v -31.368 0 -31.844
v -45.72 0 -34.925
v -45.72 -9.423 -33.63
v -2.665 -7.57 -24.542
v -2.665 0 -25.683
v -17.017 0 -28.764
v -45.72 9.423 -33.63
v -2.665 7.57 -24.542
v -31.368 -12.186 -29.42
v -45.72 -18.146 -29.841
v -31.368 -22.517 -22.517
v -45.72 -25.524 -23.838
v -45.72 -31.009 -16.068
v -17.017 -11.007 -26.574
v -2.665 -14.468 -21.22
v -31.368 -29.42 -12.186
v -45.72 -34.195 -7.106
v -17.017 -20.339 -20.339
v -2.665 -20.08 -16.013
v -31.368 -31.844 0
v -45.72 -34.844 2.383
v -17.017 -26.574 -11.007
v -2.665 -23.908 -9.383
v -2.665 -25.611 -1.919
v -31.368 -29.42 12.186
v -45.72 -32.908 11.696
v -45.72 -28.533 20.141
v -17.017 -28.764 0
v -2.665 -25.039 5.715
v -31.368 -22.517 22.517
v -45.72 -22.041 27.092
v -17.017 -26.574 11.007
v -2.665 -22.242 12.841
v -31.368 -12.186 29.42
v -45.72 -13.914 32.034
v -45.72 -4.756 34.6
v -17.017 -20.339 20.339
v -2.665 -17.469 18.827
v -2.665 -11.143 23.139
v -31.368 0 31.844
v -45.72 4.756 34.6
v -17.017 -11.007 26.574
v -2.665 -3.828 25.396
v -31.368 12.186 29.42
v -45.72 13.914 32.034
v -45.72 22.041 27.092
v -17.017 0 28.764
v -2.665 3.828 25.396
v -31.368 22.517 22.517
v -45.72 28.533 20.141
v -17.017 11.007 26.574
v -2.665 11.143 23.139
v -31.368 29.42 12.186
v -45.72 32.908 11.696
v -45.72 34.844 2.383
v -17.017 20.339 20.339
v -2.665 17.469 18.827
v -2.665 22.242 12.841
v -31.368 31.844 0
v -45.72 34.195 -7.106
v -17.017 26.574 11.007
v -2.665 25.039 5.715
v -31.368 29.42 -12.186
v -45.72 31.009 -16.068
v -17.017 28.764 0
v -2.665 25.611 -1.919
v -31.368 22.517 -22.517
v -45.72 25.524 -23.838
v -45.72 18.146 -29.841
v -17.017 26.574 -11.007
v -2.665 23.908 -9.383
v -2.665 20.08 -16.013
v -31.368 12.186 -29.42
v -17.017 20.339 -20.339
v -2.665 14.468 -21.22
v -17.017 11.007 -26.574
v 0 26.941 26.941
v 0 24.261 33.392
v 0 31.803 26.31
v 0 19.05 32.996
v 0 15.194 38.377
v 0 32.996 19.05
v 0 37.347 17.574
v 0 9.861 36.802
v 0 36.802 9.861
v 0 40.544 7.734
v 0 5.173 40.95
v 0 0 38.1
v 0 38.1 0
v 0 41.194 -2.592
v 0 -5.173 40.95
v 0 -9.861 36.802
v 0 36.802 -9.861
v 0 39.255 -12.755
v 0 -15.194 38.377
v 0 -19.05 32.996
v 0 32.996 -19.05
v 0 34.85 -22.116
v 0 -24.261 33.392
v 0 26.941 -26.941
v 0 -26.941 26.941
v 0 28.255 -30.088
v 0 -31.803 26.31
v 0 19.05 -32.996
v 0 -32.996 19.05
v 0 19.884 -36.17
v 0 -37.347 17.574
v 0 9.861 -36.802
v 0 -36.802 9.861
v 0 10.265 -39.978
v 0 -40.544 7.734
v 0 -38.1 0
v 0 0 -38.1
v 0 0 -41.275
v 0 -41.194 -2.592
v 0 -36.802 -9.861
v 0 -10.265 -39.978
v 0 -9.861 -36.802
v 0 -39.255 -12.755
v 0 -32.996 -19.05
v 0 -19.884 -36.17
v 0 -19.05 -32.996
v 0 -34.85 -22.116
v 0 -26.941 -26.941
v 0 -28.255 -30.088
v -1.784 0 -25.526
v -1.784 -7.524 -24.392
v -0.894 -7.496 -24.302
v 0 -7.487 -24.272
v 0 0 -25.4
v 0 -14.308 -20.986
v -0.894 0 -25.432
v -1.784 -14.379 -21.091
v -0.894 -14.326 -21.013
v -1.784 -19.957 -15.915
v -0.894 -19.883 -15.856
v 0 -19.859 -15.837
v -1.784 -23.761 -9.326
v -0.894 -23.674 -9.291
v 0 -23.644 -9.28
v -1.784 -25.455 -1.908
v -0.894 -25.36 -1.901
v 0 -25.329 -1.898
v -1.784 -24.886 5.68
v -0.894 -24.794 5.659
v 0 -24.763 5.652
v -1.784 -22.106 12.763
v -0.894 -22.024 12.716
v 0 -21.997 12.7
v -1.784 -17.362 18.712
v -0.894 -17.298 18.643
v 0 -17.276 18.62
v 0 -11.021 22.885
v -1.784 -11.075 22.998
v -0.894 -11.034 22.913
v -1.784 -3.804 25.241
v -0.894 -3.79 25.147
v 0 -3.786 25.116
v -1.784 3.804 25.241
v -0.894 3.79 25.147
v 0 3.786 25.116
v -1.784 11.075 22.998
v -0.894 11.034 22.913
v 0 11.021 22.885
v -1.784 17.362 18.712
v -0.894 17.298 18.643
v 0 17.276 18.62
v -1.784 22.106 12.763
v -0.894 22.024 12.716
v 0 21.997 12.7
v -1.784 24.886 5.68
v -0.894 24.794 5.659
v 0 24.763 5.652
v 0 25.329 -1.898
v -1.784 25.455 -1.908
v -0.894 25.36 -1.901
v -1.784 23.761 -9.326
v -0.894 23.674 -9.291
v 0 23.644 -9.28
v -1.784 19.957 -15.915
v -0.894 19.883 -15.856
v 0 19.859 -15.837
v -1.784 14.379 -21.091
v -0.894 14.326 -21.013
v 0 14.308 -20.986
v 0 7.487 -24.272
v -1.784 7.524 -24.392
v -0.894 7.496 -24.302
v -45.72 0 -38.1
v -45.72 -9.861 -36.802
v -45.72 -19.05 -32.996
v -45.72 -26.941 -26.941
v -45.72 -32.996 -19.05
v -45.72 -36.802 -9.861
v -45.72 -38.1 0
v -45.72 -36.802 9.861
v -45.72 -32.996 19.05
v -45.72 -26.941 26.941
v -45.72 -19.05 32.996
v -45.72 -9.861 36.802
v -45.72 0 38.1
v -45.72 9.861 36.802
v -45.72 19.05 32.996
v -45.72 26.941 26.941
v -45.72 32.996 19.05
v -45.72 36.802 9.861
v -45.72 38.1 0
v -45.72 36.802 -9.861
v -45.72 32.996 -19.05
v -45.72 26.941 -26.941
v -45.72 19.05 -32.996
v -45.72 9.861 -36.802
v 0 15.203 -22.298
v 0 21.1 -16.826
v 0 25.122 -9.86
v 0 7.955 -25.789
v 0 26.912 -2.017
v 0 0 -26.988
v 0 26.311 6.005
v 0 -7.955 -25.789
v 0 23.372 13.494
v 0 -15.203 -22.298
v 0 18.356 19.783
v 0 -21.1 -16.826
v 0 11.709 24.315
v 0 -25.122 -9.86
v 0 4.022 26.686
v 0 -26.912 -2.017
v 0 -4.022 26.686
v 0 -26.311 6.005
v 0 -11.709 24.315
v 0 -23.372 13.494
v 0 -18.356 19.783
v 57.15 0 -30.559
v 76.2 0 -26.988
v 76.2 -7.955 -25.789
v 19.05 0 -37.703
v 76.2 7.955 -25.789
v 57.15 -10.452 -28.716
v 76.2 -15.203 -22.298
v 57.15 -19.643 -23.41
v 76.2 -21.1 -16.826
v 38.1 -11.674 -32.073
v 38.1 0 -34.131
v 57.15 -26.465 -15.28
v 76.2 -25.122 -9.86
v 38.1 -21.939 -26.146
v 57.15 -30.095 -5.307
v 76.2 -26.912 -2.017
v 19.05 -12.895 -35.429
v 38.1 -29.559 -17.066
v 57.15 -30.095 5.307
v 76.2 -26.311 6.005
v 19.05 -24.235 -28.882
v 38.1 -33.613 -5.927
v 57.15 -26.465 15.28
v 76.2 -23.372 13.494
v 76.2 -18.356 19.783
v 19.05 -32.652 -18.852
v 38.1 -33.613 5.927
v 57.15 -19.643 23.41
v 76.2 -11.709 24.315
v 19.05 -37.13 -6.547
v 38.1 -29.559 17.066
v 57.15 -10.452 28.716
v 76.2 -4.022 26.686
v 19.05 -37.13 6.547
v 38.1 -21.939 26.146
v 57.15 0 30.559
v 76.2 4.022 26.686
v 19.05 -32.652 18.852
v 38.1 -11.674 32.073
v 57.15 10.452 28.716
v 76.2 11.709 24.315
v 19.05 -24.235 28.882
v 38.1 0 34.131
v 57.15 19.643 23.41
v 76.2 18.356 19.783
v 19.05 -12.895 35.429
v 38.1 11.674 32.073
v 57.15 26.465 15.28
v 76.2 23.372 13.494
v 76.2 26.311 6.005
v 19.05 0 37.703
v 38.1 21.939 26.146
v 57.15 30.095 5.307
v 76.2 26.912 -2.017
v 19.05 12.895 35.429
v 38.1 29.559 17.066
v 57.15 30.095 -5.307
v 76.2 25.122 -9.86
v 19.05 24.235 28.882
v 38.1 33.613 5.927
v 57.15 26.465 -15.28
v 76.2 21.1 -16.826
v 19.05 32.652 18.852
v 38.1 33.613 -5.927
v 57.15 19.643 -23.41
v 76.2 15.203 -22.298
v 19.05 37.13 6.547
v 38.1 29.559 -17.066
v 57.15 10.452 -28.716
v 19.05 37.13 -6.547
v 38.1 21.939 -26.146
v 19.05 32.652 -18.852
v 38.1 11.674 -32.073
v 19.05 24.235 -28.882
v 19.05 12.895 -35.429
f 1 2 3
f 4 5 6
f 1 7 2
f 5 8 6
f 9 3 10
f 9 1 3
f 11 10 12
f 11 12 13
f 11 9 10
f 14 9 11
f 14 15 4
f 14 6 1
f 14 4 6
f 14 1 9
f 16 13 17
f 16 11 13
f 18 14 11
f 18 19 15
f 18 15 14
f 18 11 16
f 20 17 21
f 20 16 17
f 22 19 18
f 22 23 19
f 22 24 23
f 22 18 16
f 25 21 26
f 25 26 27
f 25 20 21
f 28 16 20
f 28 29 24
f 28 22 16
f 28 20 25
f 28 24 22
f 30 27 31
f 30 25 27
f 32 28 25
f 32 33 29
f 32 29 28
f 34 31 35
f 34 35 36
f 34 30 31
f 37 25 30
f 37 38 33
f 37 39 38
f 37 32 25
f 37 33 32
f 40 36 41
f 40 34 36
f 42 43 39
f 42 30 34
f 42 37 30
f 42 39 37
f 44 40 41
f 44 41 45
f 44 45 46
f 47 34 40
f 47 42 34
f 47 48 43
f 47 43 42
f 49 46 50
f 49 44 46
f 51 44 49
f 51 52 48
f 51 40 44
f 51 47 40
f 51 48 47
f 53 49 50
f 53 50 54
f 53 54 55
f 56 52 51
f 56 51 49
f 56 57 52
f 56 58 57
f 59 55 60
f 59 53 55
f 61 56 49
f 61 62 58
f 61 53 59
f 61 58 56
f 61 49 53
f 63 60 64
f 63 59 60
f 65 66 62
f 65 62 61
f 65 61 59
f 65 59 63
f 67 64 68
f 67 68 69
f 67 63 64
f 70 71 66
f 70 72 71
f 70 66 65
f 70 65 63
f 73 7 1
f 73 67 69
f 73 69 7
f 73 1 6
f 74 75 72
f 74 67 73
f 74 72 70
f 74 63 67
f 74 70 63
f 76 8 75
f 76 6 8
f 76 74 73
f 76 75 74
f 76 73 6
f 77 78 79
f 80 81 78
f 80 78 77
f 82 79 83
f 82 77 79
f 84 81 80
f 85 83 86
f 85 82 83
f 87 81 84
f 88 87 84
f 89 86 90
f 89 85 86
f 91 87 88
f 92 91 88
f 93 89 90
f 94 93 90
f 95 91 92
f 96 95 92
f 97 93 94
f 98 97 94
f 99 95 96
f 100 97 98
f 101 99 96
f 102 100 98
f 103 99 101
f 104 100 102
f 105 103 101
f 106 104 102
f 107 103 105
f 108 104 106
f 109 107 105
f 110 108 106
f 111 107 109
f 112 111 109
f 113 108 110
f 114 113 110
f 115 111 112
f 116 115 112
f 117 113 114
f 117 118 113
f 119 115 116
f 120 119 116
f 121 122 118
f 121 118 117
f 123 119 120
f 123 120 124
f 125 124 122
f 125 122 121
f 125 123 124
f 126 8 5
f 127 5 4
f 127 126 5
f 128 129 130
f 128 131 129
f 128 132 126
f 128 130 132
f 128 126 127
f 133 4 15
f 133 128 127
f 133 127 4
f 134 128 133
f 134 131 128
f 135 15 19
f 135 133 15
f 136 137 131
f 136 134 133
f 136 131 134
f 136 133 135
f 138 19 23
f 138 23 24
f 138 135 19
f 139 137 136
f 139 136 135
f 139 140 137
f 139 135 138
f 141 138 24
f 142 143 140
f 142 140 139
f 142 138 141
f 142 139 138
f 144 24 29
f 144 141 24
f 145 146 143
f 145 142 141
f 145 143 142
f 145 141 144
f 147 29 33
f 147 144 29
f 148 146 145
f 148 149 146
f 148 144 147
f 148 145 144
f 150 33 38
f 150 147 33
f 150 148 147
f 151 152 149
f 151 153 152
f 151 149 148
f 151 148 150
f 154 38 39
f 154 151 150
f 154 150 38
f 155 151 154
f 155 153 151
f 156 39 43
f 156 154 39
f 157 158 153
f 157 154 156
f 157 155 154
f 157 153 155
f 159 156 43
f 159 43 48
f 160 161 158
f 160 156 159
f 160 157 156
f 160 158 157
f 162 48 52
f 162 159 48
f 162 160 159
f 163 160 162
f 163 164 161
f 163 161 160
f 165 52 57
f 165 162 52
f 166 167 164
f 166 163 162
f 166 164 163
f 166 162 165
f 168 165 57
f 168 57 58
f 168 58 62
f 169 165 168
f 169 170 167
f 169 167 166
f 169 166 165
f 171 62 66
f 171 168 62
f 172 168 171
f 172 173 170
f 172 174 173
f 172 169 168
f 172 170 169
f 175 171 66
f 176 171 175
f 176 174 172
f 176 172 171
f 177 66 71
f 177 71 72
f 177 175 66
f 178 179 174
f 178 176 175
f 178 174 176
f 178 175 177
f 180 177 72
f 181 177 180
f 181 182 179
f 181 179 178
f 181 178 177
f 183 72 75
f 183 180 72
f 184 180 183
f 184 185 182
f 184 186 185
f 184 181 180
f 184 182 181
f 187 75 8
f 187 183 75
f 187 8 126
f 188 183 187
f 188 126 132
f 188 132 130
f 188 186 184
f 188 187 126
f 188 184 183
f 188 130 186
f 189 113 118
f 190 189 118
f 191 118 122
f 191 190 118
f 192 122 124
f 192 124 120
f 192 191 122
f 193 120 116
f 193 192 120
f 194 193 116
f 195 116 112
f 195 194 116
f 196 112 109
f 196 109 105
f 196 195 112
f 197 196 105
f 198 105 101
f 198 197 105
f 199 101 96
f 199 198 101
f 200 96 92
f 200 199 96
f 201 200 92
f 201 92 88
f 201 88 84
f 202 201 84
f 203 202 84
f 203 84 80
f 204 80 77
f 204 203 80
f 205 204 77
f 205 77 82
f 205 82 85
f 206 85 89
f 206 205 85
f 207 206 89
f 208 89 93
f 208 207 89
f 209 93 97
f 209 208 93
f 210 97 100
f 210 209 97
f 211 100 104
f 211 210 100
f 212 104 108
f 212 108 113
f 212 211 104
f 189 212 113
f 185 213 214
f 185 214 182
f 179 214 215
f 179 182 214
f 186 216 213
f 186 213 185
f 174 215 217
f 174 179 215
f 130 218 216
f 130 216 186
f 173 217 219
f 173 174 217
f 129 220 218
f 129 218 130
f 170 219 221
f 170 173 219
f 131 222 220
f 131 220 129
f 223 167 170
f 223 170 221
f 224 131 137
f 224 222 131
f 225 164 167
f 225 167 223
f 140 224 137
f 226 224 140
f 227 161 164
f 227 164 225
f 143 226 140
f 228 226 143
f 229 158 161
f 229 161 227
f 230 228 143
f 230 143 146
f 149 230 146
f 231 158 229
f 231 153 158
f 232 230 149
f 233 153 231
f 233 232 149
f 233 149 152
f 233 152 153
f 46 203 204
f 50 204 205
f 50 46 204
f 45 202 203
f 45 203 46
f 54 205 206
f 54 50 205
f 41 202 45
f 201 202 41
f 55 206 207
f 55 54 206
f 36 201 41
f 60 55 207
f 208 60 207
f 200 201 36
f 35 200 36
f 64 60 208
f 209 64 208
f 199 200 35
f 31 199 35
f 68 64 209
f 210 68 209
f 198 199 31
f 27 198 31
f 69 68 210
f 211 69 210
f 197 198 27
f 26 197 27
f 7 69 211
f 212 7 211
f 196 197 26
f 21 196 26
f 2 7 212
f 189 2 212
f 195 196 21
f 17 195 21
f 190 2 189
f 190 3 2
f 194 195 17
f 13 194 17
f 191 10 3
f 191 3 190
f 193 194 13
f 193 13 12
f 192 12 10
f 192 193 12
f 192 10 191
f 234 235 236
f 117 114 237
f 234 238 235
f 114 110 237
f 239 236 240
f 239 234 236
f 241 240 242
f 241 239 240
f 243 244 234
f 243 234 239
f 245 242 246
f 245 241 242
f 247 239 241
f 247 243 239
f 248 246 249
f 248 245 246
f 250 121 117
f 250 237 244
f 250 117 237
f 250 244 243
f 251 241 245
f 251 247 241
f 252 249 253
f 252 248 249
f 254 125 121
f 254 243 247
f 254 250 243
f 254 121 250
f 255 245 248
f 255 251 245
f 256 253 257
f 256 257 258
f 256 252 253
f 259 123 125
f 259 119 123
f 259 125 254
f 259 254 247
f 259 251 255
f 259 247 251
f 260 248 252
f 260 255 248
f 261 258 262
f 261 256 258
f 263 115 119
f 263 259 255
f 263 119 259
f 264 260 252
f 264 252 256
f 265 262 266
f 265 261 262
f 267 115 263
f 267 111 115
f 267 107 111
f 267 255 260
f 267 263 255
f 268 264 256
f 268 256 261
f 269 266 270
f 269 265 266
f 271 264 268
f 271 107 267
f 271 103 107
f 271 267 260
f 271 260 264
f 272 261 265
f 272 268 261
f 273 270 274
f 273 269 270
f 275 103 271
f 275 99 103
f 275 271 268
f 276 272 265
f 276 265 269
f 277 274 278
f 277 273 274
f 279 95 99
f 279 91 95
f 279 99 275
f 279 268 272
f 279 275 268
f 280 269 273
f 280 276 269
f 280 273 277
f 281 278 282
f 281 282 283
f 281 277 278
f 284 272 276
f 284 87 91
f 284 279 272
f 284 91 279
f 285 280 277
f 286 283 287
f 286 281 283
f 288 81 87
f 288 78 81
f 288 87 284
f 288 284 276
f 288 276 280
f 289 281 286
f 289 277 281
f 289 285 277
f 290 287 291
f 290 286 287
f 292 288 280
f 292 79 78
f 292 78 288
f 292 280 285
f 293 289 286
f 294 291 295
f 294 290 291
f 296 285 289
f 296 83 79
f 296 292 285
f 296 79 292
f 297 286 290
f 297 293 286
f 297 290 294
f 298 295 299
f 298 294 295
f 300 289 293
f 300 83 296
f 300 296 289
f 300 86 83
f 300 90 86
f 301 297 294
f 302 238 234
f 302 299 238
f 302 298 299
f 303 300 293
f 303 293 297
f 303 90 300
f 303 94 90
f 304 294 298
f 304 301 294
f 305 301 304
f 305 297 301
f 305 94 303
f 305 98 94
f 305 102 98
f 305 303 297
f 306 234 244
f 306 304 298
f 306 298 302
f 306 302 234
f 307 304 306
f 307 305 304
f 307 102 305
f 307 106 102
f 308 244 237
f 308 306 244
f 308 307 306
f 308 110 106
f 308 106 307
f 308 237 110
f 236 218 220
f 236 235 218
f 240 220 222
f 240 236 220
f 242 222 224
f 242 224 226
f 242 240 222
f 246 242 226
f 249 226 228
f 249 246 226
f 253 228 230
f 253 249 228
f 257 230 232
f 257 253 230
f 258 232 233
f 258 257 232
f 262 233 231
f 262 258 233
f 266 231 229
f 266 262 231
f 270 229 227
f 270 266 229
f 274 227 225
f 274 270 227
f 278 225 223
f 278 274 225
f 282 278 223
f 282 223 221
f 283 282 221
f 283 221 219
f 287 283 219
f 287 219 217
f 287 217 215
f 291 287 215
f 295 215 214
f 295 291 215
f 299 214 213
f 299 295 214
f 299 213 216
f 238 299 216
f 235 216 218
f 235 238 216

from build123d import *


with BuildPart() as part:
    # Sketch2 → Revolve1 (revolve)
    with BuildSketch(Plane.XY, mode=Mode.PRIVATE) as revolve1_sk:
        with BuildLine():
            Line((0, 26.9875), (76.2, 26.9875))
            Line((76.2, 26.9875), (0, 41.275))
            Line((0, 41.275), (0, 38.1))
            Line((0, 38.1), (-45.72, 38.1))
            Line((-45.72, 38.1), (-45.72, 34.925))
            Line((-45.72, 34.925), (-2.665476758, 25.68286532))
            ThreePointArc((-2.665476758, 25.68286532), (-1.340221916, 25.470914316), (0, 25.4))
            Line((0, 25.4), (0, 26.9875))
        make_face()
    revolve(revolve1_sk.sketch.rotate(Axis((109.22, 0, 0), (-1, 0, 0)), 90), axis=Axis((109.22, 0, 0), (-1, 0, 0)))


solid = part.part
